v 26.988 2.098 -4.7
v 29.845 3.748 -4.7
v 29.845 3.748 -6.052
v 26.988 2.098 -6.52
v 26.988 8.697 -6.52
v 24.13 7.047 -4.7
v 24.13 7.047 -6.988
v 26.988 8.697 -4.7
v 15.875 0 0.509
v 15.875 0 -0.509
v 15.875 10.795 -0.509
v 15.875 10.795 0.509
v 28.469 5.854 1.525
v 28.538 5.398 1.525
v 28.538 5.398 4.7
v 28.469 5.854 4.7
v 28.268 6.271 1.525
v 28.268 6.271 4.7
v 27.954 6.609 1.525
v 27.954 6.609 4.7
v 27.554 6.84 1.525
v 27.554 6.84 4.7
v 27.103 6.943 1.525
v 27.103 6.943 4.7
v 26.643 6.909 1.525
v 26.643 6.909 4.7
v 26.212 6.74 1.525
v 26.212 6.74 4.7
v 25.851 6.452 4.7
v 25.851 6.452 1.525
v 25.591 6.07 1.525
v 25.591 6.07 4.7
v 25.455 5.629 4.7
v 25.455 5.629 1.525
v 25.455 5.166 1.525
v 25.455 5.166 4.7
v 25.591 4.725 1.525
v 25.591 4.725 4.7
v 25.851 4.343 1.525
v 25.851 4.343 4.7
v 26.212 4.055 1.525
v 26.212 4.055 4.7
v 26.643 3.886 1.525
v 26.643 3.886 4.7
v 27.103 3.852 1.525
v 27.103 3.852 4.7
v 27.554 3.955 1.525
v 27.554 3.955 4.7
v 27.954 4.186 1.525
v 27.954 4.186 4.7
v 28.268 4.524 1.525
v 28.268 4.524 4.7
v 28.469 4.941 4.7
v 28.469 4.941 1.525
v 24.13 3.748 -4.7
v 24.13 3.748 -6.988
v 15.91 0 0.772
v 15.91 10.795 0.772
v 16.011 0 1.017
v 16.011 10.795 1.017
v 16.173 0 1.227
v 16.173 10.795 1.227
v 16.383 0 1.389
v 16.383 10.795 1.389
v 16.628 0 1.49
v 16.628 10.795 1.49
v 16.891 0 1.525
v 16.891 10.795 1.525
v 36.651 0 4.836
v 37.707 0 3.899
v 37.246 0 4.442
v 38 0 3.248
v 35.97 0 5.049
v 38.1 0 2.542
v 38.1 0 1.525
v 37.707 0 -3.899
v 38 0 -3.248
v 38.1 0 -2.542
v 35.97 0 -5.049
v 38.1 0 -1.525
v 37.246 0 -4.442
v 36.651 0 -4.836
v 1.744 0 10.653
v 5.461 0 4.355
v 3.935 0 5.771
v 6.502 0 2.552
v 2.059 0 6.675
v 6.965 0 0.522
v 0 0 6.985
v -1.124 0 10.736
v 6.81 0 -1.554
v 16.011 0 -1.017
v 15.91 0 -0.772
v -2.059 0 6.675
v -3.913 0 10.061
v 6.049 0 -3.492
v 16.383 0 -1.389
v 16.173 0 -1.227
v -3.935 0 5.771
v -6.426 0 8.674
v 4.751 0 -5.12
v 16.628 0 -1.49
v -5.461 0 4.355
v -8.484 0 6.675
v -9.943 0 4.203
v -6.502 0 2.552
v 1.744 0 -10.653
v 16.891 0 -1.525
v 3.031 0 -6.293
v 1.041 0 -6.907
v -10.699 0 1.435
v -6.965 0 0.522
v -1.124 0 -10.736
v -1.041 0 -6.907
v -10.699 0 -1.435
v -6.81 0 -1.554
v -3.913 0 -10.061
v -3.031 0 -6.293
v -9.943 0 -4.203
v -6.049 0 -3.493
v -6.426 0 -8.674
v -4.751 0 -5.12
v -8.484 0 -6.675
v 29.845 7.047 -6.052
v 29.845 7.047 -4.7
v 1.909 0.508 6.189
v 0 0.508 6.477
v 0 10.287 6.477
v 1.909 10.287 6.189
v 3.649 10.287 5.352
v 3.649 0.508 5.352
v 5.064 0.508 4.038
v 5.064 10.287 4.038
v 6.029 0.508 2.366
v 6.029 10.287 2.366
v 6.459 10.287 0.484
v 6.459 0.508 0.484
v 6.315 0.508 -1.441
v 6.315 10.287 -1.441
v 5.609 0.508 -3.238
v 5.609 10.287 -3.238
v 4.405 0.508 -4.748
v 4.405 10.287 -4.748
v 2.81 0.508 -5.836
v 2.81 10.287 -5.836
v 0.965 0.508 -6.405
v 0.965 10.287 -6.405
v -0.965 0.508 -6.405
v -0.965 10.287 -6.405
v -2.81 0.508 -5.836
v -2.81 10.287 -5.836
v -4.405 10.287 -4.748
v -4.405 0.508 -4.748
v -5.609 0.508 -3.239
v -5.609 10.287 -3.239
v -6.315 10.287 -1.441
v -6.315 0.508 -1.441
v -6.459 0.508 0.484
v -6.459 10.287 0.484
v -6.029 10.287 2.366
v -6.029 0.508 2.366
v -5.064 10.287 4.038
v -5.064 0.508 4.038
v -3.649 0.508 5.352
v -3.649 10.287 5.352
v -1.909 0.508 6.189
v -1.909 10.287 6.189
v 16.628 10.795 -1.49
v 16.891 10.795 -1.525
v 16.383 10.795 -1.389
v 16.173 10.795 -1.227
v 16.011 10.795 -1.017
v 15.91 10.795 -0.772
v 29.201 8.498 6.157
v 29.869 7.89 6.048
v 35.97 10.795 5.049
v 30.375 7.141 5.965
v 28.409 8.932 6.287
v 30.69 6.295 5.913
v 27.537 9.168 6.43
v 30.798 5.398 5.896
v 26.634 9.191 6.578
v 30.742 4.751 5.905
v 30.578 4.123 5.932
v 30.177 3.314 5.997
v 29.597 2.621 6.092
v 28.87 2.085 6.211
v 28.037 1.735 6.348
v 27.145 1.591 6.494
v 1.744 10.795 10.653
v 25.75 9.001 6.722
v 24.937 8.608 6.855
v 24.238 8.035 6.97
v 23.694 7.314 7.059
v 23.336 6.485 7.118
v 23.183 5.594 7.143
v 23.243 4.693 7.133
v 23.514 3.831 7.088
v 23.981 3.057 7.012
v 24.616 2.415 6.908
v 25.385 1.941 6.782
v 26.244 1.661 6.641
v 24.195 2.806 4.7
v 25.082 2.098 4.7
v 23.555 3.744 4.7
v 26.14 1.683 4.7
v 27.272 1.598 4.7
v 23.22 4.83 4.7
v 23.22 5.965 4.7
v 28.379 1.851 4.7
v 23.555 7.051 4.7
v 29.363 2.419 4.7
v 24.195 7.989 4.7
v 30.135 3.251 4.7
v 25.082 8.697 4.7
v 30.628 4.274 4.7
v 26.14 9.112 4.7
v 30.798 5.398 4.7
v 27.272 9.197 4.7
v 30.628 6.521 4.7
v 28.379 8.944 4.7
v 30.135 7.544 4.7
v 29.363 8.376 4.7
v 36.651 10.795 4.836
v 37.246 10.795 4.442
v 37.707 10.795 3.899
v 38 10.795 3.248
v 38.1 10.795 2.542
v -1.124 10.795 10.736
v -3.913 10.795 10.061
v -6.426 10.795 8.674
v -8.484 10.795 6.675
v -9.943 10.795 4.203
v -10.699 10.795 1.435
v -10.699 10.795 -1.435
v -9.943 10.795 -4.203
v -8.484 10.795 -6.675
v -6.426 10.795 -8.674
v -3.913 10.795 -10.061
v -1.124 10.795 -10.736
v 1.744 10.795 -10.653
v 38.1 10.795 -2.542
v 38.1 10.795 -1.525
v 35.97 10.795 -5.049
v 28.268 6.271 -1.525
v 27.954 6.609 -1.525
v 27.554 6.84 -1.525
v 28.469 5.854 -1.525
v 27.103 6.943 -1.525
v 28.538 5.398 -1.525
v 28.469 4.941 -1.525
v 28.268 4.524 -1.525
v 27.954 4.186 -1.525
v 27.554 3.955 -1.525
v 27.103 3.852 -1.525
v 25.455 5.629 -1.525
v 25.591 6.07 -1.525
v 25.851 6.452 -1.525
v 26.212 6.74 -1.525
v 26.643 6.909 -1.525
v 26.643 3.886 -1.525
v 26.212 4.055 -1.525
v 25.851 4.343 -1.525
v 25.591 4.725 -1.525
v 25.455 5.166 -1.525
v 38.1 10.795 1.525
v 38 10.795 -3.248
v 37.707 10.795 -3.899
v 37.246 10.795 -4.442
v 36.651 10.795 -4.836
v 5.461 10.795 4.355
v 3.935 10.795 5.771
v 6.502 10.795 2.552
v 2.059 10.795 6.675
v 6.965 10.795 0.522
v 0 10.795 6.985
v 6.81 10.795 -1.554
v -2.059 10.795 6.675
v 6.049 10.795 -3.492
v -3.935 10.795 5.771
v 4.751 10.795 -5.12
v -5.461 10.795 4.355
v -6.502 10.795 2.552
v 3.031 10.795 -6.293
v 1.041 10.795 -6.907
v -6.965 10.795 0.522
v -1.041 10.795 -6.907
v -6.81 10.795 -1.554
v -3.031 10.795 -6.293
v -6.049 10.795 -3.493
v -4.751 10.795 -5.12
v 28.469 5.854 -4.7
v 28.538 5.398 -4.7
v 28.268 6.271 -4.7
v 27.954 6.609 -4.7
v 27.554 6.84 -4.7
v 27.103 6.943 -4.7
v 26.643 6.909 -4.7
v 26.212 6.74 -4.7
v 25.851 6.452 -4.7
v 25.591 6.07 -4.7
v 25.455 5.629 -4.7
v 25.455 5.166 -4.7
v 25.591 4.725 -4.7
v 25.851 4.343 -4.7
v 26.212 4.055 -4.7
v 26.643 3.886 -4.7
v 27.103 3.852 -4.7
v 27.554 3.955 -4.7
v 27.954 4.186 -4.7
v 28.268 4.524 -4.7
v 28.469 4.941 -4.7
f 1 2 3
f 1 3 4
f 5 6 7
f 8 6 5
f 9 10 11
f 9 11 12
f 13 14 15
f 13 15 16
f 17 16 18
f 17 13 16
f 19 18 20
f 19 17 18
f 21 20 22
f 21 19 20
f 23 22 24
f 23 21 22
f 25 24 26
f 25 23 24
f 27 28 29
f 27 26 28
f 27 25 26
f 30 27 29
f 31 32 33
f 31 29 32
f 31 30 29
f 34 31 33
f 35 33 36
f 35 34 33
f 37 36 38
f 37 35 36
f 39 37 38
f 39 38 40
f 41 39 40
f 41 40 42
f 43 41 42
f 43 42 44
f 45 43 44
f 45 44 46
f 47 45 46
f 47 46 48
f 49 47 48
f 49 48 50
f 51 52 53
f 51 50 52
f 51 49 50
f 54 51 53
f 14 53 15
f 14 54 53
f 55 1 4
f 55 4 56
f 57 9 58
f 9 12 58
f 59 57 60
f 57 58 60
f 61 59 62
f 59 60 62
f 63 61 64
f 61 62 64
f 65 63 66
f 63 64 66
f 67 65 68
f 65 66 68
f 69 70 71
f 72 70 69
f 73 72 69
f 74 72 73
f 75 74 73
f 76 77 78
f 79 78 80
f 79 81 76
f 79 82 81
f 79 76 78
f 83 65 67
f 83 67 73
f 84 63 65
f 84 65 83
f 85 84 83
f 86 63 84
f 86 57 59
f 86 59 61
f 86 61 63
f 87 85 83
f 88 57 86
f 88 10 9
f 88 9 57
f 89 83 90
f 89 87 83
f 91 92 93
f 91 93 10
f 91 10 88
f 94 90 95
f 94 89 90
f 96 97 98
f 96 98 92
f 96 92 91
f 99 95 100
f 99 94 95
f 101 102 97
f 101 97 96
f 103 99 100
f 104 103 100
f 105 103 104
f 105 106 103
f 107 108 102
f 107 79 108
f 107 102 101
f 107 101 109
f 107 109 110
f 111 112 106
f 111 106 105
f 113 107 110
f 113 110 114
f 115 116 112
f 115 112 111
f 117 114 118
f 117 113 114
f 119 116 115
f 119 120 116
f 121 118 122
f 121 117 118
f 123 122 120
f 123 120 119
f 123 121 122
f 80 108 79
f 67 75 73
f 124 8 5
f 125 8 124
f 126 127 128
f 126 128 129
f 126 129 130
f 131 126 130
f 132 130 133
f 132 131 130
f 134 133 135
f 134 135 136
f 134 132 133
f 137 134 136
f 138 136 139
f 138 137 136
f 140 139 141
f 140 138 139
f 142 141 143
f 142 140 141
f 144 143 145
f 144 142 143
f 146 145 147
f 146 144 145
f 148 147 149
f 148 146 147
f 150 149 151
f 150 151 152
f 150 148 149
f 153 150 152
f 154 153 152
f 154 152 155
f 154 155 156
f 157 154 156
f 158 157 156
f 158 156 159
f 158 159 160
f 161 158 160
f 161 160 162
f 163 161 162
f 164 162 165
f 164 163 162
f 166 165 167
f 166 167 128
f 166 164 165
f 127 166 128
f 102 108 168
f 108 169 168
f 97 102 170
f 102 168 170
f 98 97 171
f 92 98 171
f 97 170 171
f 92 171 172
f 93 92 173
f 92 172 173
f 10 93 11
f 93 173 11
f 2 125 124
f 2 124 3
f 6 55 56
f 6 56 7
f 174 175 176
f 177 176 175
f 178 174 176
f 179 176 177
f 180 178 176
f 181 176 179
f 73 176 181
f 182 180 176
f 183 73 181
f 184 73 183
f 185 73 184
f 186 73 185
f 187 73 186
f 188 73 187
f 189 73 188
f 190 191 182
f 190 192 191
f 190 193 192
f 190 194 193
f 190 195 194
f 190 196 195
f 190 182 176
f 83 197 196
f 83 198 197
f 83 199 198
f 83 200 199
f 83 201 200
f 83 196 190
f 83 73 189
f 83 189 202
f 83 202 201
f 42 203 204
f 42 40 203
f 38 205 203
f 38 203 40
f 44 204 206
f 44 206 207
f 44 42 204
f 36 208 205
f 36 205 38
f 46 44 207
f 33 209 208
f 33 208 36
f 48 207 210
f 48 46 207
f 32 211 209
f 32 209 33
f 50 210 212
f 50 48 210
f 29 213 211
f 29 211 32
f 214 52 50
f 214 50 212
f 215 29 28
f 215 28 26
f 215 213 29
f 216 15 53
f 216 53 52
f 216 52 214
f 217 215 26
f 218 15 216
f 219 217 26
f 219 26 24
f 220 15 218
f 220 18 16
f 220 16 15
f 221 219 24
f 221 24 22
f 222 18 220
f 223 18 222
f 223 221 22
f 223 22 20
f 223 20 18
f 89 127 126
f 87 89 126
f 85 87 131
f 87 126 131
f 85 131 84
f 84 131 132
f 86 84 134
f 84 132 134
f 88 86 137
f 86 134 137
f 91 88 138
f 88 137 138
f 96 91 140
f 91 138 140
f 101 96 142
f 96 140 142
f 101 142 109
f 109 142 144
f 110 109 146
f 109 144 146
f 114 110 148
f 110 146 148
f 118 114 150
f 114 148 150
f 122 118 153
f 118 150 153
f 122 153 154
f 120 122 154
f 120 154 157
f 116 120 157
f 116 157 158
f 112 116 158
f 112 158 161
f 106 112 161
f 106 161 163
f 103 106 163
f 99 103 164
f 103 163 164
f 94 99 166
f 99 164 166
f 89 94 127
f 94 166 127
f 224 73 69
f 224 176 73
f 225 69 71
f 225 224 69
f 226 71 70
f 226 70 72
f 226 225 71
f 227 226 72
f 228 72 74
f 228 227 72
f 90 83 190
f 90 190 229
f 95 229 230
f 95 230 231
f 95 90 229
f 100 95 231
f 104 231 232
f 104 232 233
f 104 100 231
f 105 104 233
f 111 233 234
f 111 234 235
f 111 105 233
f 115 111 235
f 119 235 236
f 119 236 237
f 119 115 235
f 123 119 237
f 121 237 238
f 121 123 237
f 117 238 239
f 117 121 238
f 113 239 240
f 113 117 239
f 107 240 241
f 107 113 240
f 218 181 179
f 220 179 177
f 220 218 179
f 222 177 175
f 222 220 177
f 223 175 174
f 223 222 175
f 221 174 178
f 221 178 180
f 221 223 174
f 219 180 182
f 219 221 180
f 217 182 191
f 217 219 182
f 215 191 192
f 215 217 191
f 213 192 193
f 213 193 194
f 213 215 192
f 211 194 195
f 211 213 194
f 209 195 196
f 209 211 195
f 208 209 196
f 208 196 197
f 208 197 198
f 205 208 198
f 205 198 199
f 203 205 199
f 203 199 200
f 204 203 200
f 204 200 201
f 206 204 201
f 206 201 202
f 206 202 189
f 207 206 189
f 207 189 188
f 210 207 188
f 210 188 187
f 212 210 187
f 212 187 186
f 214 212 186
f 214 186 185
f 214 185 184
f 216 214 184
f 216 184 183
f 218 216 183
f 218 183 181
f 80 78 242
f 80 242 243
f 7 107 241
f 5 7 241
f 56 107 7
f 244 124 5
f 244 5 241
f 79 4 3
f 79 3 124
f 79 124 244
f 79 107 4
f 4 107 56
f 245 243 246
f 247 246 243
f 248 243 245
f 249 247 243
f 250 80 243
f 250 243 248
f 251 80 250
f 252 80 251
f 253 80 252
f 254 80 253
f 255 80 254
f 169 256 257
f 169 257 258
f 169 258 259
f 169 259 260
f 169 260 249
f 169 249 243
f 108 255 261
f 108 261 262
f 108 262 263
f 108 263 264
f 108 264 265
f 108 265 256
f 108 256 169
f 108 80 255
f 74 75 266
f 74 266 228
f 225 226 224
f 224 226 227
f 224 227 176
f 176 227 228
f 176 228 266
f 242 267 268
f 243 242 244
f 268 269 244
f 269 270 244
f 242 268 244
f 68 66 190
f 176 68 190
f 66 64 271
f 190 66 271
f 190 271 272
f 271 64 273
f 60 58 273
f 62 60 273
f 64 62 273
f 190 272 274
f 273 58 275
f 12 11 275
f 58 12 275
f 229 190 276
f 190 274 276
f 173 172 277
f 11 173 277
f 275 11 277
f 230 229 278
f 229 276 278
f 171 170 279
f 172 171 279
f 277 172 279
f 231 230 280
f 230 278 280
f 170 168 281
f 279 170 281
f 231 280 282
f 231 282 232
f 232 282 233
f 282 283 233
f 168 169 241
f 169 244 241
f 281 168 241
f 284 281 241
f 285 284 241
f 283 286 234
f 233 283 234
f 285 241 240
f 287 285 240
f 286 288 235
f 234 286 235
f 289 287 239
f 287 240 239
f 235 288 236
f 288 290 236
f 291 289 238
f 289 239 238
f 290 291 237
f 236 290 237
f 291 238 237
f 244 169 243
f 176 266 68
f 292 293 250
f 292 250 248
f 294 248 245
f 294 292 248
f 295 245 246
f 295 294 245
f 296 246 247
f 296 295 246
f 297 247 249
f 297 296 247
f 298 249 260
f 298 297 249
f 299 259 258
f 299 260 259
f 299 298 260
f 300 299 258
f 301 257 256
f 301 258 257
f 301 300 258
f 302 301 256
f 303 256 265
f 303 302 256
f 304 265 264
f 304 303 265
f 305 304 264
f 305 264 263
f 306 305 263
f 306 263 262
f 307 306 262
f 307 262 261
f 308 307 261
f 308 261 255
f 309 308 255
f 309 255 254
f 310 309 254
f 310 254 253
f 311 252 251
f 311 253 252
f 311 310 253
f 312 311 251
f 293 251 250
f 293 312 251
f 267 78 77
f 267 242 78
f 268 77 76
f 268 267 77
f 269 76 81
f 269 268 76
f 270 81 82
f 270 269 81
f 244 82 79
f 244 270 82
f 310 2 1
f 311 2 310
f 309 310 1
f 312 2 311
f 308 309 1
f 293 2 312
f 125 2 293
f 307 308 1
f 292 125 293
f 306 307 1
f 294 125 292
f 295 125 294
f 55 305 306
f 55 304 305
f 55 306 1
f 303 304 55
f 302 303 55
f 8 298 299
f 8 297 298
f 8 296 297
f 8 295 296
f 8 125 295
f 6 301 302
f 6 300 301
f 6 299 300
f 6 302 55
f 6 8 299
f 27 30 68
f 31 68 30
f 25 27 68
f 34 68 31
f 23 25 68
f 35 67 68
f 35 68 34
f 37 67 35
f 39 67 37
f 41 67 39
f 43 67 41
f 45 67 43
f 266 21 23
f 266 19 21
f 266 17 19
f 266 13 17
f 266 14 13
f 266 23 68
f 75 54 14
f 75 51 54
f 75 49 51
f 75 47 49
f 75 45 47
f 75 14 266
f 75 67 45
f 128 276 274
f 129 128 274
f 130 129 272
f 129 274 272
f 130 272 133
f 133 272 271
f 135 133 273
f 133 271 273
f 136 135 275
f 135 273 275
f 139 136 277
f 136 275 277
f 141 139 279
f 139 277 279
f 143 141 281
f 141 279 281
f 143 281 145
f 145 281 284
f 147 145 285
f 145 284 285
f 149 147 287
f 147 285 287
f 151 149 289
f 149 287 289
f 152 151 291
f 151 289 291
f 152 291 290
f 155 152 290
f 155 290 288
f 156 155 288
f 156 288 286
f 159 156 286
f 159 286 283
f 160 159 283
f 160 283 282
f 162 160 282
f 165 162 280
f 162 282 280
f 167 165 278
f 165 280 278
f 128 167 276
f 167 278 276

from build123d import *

# Parameters (mm, degrees)
SKETCH1_R               = 6.477
BOSS_EXTRUDE1_DEPTH     = 10.795
CUT_EXTRUDE3_DEPTH      = 64.211808035
CUT_EXTRUDE3_DEPTH_BACK = 64.211808035
SKETCH8_R               = 1.55
SKETCH9_R               = 3.81
CUT_EXTRUDE4_DEPTH      = 64.211808035
CUT_EXTRUDE5_DEPTH      = 64.211808035
FILLET1_R               = 1.016
SKETCH13_W              = 22.225
SKETCH13_H              = 9.4
CUT_EXTRUDE6_DEPTH      = 63.22676012
FILLET7_R               = 2.54
CHAMFER2_SIZE           = 0.508


with BuildPart() as part:
    # Sketch1 → Boss-Extrude1 (new body)
    with BuildSketch(Plane(origin=(0, 0, 0), x_dir=(1, 0, 0), z_dir=(0, 1, 0))):
        with BuildLine():
            Line((1.744418558, 10.653122964), (38.1, 4.7))
            Line((38.1, 4.7), (60.325, 4.7))
            Line((60.325, 4.7), (60.325, 1.525))
            Line((60.325, 1.525), (15.875, 1.525))
            Line((15.875, 1.525), (15.875, -1.525))
            Line((15.875, -1.525), (60.325, -1.525))
            Line((60.325, -1.525), (60.325, -4.7))
            Line((60.325, -4.7), (38.1, -4.7))
            Line((38.1, -4.7), (1.744418558, -10.653122964))
            ThreePointArc((1.744418558, -10.653122964), (-10.795, 0), (1.744418558, 10.653122964))
        make_face()
        with Locations(Location((0, 0, 0), (0, 0, 270))):
            Circle(SKETCH1_R, mode=Mode.SUBTRACT)
    extrude(amount=BOSS_EXTRUDE1_DEPTH)

    # Sketch8 → Cut-Extrude3 (cut, two sides: drawn at the far end of the back side and taken through both)
    with BuildSketch(Plane.XY.offset(4.7).offset(-CUT_EXTRUDE3_DEPTH_BACK)):
        with Locations((26.9875, 5.3975)):
            Circle(SKETCH8_R)
        with Locations((49.2125, 5.3975)):
            Circle(SKETCH8_R)
    extrude(amount=CUT_EXTRUDE3_DEPTH + CUT_EXTRUDE3_DEPTH_BACK, mode=Mode.SUBTRACT)

    # Sketch9 → Cut-Extrude4 (cut, through all)
    with BuildSketch(Plane.XY.offset(4.7)):
        with Locations((26.9875, 5.3975)):
            Circle(SKETCH9_R)
    extrude(amount=CUT_EXTRUDE4_DEPTH, mode=Mode.SUBTRACT)

    # Sketch10 → Cut-Extrude5 (cut, through all)
    with BuildSketch(Plane(origin=(0, 0, -4.7), x_dir=(-1, 0, 0), z_dir=(0, 0, -1))):
        Polygon((-24.13, 3.747721606), (-24.13, 7.047278394), (-26.9875, 8.697056788), (-29.845, 7.047278394), (-29.845, 3.747721606), (-26.9875, 2.097943212), align=None)
    extrude(amount=CUT_EXTRUDE5_DEPTH, mode=Mode.SUBTRACT)

    # Fillet1
    fillet1_edges = [part.edges().sort_by_distance(p)[0] for p in [
        (15.875, 5.3975, -1.525),
        (15.875, 5.3975, 1.525),
    ]]
    fillet(fillet1_edges, radius=FILLET1_R)

    # Sketch13 → Cut-Extrude6 (cut, through all)
    with BuildSketch(Plane.XZ):
        with Locations((49.2125, 0)):
            Rectangle(SKETCH13_W, SKETCH13_H)
    extrude(amount=-CUT_EXTRUDE6_DEPTH, mode=Mode.SUBTRACT)

    # Fillet7
    fillet7_edges = [part.edges().sort_by_distance(p)[0] for p in [
        (38.1, 5.3975, -4.7),
        (38.1, 5.3975, 4.7),
    ]]
    fillet(fillet7_edges, radius=FILLET7_R)

    # Chamfer2
    chamfer2_edges = [part.edges().sort_by_distance(p)[0] for p in [
        (0, 0, -6.477),
        (0, 10.795, -6.477),
    ]]
    chamfer(chamfer2_edges, length=CHAMFER2_SIZE)


solid = part.part
